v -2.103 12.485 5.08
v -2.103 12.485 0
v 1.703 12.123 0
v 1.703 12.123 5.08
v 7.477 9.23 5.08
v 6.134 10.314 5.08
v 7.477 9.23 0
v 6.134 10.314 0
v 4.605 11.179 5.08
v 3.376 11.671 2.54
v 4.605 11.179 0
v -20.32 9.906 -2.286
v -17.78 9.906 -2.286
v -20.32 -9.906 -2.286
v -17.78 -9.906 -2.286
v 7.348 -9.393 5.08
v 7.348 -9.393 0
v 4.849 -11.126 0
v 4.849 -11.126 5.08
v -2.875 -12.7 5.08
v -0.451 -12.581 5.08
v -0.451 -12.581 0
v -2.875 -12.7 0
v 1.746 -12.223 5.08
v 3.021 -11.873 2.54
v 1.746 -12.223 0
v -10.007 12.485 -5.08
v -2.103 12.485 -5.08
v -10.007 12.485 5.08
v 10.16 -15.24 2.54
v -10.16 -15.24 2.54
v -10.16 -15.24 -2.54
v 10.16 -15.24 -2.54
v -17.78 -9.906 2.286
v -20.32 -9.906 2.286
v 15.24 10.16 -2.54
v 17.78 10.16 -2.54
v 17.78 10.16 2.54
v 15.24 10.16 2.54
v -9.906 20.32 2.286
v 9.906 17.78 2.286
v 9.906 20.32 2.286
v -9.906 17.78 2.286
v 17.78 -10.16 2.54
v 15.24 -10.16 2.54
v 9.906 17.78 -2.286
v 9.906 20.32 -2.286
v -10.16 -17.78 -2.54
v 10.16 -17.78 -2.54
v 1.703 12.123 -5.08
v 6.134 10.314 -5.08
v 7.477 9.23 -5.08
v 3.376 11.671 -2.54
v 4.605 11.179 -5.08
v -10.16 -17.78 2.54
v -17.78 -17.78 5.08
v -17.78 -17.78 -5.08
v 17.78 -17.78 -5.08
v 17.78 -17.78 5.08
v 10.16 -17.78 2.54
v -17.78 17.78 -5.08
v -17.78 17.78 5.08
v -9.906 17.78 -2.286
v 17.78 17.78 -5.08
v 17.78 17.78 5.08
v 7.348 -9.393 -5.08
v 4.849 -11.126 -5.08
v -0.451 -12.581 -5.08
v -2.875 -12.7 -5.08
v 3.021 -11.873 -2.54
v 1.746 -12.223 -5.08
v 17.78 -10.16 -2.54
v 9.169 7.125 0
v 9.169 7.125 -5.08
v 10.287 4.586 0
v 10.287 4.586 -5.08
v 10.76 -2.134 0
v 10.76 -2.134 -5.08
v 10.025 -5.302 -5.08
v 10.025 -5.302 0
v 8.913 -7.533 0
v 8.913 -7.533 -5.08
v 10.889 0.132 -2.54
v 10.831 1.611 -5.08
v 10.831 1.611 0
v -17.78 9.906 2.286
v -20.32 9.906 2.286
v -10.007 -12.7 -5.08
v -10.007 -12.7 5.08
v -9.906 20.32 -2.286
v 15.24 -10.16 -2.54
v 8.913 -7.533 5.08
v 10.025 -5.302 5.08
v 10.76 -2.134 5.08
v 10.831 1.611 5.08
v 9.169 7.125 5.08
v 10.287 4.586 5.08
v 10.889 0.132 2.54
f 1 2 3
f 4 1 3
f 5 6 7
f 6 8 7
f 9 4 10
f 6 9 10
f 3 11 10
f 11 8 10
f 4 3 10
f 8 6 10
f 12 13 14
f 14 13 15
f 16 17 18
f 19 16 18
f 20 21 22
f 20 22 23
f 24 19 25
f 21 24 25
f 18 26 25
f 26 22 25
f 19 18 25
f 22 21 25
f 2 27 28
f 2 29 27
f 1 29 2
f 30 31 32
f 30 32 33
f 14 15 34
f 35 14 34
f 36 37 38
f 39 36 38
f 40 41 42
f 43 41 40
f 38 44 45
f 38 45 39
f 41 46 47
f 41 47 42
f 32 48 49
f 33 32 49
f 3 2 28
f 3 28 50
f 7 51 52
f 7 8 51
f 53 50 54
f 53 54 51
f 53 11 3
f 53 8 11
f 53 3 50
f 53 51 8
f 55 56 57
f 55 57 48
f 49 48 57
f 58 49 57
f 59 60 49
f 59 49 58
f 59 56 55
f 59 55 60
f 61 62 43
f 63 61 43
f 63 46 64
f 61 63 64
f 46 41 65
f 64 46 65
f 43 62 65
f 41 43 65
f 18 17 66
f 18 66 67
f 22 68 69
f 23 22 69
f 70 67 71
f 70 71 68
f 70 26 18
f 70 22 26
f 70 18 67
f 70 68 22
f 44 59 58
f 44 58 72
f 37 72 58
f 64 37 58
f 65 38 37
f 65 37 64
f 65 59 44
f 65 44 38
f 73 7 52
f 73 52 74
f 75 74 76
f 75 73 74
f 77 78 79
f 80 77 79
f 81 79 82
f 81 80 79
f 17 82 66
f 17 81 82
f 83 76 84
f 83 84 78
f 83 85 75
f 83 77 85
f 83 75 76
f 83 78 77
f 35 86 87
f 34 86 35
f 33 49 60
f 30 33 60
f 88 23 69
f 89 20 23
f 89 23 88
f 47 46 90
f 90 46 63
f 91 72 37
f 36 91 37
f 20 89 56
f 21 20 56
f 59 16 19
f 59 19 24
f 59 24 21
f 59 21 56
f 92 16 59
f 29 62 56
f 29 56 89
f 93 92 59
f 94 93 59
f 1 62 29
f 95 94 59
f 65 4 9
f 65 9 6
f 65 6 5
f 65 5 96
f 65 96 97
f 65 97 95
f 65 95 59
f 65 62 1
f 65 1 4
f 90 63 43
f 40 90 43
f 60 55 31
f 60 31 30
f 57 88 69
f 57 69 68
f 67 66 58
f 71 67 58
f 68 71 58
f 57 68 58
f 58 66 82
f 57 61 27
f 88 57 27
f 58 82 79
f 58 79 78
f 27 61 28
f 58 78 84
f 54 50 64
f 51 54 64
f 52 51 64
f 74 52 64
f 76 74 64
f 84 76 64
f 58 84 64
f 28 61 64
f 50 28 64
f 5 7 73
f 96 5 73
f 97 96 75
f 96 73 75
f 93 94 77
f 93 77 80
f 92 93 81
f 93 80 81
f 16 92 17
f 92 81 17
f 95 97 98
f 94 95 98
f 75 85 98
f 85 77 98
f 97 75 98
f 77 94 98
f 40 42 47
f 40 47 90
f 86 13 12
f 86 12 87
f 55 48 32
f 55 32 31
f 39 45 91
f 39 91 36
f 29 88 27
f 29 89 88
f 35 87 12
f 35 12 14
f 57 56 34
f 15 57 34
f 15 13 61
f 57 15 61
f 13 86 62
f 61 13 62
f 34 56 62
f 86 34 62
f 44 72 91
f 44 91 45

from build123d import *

# Parameters (mm, degrees)
F0_W     = 35.56
F0_H     = 35.56
F1_DEPTH = 5.08
F2_W     = 19.812
F2_H     = 4.572
F3_DEPTH = 2.54
F4_W     = 19.812
F4_H     = 4.572
F5_DEPTH = 2.54
F6_W     = 20.32
F6_H     = 5.08
F7_DEPTH = 2.54
F8_W     = 20.32
F8_H     = 5.08
F9_DEPTH = 2.54


with BuildPart() as f1:
    # F0 (on Top) → F1 (new body, symmetric)
    with BuildSketch(Plane.XY):
        Rectangle(F0_W, F0_H)
        with BuildLine():
            add(Edge.make_bspline(
                [(7.4772352431, 9.2300998264), (10.8892578125, 5.9751736111), (10.8892578125, 0.1322916667)],
                knots=[0, 0, 0, 1, 1, 1], degree=2))
            add(Edge.make_bspline(
                [(10.8892578125, 0.1322916667), (10.8892578125, -6.0854166667), (7.3476996528, -9.3927083333)],
                knots=[0, 0, 0, 1, 1, 1], degree=2))
            add(Edge.make_bspline(
                [(7.3476996528, -9.3927083333), (3.8061414931, -12.7), (-2.8745876736, -12.7)],
                knots=[0, 0, 0, 1, 1, 1], degree=2))
            Line((-2.8745876736, -12.7), (-10.0073133681, -12.7))
            Line((-10.0073133681, -12.7), (-10.0073133681, 12.4850260417))
            Line((-10.0073133681, 12.4850260417), (-2.1028862847, 12.4850260417))
            add(Edge.make_bspline(
                [(-2.1028862847, 12.4850260417), (4.0652126736, 12.4850260417), (7.4772352431, 9.2300998264)],
                knots=[0, 0, 0, 1, 1, 1], degree=2))
        make_face(mode=Mode.SUBTRACT)
    extrude(amount=F1_DEPTH, both=True)

    # F2 (on face) → F3 (join)
    with BuildSketch(Plane(origin=(0, 17.78, 0), x_dir=(-1, 0, 0), z_dir=(0, 1, 0))):
        Rectangle(F2_W, F2_H)
    extrude(amount=F3_DEPTH)

    # F4 (on face) → F5 (join)
    with BuildSketch(Plane(origin=(-17.78, 0, 0), x_dir=(0, -1, 0), z_dir=(-1, 0, 0))):
        Rectangle(F4_W, F4_H)
    extrude(amount=F5_DEPTH)

    # F6 (on face) → F7 (cut)
    with BuildSketch(Plane.XZ.offset(17.78)):
        Rectangle(F6_W, F6_H)
    extrude(amount=-F7_DEPTH, mode=Mode.SUBTRACT)

    # F8 (on face) → F9 (cut)
    with BuildSketch(Plane.YZ.offset(17.78)):
        Rectangle(F8_W, F8_H)
    extrude(amount=-F9_DEPTH, mode=Mode.SUBTRACT)


solid = f1.part
